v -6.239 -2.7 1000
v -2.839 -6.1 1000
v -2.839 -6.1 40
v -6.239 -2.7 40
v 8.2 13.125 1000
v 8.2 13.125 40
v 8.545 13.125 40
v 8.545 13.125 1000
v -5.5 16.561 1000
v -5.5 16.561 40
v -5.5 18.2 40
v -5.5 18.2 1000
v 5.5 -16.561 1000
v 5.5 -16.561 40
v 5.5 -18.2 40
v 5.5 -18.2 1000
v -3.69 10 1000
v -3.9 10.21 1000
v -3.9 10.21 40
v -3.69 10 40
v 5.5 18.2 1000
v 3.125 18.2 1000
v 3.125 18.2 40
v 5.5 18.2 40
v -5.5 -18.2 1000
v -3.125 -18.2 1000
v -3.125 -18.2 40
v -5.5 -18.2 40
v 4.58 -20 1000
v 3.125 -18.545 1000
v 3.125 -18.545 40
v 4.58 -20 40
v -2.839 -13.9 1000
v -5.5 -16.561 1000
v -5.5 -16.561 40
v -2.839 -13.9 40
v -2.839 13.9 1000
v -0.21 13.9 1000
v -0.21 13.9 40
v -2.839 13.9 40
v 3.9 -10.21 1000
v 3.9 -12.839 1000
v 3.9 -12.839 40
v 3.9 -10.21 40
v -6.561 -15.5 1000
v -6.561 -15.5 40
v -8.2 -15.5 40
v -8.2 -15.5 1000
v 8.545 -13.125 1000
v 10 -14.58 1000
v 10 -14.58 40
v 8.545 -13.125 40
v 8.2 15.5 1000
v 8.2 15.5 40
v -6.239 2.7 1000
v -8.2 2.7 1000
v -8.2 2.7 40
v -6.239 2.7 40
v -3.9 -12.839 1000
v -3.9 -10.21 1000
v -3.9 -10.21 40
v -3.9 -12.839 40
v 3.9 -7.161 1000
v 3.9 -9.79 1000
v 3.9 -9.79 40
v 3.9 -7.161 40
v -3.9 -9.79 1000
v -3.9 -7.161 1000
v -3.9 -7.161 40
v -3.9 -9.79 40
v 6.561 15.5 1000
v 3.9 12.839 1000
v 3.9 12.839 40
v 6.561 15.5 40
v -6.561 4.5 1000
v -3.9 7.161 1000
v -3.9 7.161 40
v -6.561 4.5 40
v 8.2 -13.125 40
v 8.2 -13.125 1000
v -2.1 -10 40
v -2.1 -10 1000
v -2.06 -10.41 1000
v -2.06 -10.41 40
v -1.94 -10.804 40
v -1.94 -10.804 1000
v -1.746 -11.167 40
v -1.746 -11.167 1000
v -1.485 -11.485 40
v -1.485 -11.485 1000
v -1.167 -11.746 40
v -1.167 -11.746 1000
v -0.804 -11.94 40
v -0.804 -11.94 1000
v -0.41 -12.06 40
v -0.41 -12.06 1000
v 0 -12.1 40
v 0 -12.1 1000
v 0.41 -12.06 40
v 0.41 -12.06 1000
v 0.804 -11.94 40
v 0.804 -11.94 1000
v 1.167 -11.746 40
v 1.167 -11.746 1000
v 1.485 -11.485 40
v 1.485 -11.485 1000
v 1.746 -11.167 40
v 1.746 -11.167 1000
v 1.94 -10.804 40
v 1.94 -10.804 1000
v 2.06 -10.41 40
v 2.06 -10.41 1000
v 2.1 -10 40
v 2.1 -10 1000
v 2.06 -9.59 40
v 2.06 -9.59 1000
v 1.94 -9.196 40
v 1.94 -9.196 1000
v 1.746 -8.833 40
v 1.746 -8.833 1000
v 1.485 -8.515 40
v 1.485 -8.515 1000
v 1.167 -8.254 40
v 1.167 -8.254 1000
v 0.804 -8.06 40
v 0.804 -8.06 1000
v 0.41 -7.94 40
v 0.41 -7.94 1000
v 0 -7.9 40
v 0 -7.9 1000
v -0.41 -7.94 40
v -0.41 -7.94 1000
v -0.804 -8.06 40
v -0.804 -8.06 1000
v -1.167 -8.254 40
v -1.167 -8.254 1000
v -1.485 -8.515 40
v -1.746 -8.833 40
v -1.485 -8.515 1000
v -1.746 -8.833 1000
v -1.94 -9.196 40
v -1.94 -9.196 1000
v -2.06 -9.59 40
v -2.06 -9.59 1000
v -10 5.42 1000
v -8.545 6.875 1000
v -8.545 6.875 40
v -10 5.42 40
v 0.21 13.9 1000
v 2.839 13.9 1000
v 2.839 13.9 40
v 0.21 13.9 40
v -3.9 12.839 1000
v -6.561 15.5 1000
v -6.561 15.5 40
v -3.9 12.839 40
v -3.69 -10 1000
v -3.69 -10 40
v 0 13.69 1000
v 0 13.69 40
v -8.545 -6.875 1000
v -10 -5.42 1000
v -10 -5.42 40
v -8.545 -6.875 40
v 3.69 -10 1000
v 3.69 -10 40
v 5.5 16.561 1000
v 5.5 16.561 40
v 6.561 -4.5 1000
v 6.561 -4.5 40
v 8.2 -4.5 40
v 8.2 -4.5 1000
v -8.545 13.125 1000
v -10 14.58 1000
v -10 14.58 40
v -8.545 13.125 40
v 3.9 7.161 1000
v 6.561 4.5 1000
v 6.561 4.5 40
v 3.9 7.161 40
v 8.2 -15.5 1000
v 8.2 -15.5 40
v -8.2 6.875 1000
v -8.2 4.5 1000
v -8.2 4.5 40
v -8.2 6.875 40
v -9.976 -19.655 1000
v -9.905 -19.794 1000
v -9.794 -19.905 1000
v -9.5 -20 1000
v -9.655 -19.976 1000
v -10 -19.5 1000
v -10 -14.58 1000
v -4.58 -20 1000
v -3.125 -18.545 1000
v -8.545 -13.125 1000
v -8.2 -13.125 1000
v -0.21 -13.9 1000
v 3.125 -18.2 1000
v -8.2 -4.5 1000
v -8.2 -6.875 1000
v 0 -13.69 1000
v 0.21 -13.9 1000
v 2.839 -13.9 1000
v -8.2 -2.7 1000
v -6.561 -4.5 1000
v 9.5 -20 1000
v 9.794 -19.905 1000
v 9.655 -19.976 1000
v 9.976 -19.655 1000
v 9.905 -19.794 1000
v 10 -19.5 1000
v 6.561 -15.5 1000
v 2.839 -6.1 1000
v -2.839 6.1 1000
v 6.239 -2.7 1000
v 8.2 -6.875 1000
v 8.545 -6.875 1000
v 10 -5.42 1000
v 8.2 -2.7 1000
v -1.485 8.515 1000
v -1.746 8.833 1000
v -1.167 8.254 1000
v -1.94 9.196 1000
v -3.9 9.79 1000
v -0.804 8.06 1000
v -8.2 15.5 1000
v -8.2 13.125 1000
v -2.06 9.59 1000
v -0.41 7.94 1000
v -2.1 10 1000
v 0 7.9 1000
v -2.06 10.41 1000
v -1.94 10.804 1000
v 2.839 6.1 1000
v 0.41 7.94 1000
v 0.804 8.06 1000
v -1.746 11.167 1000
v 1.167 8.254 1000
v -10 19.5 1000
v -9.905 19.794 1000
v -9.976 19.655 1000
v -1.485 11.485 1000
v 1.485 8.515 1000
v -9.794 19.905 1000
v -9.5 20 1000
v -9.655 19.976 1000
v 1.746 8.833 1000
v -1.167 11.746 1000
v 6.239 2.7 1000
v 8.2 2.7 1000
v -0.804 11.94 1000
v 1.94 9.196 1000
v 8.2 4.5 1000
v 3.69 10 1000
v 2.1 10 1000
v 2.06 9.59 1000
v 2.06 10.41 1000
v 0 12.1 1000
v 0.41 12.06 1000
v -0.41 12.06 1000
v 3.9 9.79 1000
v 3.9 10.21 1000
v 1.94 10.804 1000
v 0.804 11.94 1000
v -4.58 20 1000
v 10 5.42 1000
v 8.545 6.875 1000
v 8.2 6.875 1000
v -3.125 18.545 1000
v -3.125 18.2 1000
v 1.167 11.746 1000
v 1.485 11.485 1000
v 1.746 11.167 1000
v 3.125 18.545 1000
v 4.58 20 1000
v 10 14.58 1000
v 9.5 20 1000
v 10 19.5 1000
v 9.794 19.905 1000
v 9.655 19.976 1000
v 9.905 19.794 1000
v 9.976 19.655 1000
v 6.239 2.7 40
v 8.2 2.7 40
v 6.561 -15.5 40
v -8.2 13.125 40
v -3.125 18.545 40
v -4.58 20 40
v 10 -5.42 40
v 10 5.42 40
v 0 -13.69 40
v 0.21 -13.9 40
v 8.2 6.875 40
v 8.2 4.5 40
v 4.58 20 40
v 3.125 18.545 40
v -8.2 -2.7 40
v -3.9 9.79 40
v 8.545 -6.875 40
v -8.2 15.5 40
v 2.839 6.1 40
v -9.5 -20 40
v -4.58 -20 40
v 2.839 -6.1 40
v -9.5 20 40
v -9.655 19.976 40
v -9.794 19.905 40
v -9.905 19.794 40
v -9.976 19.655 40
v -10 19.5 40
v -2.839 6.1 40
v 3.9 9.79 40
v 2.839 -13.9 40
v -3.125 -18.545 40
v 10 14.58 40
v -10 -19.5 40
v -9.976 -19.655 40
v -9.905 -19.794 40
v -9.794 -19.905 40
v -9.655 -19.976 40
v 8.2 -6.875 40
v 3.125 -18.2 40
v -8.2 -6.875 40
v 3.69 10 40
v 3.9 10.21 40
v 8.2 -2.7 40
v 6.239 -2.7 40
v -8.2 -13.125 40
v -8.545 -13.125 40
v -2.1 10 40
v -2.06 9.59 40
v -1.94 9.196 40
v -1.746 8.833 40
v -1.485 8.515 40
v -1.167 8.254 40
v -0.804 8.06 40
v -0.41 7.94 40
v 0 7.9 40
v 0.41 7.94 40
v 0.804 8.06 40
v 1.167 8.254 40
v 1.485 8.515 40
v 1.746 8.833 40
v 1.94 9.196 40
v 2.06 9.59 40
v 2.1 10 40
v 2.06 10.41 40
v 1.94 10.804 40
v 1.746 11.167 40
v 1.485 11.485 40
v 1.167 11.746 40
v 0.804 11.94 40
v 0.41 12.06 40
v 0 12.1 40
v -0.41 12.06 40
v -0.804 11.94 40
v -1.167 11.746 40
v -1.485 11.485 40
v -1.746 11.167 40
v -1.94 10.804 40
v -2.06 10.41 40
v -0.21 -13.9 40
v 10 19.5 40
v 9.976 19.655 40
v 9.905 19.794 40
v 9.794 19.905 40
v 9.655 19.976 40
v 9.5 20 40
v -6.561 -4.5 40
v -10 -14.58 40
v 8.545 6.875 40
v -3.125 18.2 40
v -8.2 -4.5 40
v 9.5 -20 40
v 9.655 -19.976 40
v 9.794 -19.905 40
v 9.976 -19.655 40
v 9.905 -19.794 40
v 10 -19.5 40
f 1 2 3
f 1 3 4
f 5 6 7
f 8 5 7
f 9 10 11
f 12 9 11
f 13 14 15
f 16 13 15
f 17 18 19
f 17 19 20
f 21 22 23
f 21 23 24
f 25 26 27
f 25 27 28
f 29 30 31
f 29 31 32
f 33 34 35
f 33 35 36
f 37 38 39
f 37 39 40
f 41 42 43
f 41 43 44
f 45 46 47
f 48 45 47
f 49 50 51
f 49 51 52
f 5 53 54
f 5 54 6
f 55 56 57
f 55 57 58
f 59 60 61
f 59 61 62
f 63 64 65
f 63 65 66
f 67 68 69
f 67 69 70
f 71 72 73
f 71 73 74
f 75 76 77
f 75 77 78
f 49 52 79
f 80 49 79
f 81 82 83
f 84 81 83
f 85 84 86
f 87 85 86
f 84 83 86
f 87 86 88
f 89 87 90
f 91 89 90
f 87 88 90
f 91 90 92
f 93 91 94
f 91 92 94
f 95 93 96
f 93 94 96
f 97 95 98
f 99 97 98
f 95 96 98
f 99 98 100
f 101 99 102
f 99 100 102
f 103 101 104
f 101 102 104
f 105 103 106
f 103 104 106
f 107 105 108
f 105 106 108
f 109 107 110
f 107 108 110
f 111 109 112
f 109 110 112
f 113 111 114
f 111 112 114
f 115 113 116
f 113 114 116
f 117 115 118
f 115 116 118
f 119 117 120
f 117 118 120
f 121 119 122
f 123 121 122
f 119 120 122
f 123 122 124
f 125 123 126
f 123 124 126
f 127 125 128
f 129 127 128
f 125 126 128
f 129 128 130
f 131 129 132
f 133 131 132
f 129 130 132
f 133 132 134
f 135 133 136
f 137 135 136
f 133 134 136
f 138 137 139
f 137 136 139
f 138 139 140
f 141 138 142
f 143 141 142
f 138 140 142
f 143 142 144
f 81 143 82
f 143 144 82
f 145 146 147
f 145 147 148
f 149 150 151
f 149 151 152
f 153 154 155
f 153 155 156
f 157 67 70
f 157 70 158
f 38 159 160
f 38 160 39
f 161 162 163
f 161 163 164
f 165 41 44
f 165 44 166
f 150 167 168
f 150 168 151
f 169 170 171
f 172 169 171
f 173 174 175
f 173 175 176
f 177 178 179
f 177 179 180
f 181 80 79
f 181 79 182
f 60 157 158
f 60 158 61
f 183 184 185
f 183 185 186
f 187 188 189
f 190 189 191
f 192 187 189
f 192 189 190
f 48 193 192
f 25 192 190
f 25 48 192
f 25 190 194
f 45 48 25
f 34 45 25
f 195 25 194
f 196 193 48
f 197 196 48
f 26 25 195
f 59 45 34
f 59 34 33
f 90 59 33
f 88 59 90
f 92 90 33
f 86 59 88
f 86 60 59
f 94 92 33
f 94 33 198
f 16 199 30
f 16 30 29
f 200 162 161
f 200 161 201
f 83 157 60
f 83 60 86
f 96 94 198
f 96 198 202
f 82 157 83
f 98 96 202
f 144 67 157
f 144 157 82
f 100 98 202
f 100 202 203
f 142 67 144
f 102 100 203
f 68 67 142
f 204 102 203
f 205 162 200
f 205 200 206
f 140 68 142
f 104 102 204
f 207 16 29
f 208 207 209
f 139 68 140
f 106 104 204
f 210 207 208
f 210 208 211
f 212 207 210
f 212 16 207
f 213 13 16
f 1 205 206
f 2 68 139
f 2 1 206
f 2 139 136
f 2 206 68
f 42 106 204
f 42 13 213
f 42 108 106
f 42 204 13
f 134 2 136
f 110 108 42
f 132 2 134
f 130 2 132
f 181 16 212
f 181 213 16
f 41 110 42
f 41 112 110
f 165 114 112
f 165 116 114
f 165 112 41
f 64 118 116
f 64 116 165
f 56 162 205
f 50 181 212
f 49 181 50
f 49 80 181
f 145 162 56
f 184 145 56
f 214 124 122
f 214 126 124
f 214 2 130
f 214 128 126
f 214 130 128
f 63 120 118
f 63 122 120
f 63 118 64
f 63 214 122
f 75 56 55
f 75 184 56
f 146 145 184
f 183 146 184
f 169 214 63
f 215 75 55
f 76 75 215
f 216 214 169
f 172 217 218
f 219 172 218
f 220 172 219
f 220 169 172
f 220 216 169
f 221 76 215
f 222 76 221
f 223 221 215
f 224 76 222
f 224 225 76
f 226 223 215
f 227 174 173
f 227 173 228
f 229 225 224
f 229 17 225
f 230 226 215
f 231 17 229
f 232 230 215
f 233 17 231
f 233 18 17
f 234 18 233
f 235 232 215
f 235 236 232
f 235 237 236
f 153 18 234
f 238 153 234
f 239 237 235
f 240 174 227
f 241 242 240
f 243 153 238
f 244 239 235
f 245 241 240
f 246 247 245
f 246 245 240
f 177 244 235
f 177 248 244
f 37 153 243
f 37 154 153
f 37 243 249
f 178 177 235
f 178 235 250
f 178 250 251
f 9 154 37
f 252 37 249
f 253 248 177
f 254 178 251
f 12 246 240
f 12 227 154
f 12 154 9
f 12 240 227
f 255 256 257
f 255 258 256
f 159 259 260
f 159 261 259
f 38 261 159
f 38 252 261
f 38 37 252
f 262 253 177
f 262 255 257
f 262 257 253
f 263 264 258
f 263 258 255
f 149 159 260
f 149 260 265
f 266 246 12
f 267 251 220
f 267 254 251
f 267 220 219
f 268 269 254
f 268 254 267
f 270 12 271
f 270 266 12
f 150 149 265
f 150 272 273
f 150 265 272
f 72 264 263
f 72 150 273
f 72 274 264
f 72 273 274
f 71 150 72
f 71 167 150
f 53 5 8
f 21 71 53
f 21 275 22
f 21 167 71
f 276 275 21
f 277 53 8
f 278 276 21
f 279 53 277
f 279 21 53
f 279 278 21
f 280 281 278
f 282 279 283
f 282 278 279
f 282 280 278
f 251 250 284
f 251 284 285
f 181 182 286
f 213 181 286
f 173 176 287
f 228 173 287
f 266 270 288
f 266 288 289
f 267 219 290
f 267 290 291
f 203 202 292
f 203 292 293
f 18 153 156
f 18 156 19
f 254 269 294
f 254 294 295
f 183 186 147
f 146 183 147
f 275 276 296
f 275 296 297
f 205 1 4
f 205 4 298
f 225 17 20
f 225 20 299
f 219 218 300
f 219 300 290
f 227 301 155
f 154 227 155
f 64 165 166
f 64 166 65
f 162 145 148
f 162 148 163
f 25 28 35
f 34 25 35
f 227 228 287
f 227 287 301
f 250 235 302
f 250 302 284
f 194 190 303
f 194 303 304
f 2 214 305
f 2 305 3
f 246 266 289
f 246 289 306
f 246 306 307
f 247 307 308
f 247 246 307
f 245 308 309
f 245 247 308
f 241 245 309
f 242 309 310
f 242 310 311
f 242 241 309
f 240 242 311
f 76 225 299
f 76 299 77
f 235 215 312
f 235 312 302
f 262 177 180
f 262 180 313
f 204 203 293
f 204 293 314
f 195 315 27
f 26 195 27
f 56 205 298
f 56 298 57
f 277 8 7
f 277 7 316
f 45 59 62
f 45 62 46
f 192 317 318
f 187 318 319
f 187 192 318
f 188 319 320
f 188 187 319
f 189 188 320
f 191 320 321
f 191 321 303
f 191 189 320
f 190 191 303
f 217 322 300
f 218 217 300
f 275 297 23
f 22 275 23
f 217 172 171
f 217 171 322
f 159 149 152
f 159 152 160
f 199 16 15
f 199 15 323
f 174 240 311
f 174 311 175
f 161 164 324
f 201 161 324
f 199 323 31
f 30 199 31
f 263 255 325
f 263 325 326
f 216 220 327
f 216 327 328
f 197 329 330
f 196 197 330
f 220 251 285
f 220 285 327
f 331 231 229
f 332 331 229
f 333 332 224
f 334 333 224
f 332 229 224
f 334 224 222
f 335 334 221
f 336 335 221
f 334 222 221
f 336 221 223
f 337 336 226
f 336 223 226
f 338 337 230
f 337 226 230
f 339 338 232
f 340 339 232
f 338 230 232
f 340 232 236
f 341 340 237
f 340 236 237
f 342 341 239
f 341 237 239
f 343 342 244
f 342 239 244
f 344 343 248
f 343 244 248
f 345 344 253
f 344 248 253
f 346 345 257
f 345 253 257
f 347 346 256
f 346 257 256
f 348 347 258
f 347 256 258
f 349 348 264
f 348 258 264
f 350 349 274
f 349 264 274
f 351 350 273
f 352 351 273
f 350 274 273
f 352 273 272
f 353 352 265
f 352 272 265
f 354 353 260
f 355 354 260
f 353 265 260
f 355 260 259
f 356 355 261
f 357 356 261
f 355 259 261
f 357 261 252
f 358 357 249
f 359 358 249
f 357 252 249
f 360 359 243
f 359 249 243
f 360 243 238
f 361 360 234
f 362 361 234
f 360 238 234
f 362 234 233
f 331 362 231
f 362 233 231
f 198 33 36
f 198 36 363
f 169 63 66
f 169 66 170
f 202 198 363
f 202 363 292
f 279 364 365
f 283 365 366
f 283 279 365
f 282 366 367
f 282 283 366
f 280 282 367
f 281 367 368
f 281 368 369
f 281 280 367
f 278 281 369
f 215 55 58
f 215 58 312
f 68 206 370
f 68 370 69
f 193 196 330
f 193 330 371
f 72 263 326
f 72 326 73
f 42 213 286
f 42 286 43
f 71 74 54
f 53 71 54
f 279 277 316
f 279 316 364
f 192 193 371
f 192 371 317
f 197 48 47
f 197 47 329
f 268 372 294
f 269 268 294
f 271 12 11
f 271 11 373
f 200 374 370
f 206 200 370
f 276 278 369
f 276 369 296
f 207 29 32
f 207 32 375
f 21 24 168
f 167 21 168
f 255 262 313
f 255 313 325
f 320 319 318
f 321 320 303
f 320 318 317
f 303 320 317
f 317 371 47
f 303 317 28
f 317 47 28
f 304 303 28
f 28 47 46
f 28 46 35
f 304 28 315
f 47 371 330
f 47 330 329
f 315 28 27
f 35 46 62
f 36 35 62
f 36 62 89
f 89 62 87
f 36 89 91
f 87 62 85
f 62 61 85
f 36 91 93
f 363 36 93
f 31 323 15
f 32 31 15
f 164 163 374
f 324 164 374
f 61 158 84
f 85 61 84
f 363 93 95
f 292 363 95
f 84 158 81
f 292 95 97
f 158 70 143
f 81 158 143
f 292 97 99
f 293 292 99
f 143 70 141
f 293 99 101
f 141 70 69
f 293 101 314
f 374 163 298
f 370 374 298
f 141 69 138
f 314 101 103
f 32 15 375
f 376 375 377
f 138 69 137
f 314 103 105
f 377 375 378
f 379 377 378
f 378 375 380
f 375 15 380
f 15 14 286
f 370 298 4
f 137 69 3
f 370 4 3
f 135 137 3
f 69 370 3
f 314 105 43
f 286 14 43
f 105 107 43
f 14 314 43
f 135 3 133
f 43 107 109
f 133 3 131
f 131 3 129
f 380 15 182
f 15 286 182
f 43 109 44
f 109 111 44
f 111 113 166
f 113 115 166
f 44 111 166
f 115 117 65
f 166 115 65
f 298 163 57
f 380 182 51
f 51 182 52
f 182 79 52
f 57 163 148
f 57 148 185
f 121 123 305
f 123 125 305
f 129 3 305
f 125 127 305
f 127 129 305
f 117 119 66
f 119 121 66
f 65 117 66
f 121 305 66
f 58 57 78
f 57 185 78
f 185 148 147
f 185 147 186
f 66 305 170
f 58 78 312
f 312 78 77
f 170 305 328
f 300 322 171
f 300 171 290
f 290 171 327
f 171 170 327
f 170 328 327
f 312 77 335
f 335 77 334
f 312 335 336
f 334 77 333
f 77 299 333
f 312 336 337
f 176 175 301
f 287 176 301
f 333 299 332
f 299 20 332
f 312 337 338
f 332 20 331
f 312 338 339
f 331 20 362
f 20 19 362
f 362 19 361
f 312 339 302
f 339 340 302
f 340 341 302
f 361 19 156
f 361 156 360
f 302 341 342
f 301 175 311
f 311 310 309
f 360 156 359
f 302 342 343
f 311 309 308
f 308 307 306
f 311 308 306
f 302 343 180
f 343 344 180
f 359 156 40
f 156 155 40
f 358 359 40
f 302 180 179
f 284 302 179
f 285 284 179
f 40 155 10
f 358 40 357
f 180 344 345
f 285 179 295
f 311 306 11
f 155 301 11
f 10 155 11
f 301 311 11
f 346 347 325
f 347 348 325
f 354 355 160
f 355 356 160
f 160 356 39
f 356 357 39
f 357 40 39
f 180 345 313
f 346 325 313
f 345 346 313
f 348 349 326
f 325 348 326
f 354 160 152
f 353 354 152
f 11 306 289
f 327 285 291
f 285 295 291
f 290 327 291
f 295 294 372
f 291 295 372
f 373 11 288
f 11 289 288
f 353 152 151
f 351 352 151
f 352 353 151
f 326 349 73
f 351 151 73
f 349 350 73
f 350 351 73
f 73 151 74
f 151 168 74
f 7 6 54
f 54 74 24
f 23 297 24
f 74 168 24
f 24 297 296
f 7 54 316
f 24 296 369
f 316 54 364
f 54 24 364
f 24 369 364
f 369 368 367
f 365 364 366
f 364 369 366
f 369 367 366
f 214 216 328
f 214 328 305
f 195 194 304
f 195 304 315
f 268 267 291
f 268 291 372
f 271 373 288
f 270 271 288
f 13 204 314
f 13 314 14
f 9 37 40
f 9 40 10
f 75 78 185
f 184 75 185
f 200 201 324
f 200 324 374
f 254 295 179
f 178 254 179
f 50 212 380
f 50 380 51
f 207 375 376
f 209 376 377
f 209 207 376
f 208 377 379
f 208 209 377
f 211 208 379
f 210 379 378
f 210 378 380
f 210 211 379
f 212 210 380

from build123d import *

# Parameters (mm, degrees)
SKETCH1_R           = 2.1
BOSS_EXTRUDE1_DEPTH = 960


with BuildPart() as part:
    # Sketch1 → Boss-Extrude1 (new body)
    with BuildSketch(Plane.XY.offset(1000)):
        with BuildLine():
            Line((6.560660172, 4.5), (3.9, 7.160660172))
            Line((3.9, 7.160660172), (3.9, 9.79))
            Line((3.9, 9.79), (3.69, 10))
            Line((3.69, 10), (3.9, 10.21))
            Line((3.9, 10.21), (3.9, 12.839339828))
            Line((3.9, 12.839339828), (6.560660172, 15.5))
            Line((6.560660172, 15.5), (8.2, 15.5))
            Line((8.2, 15.5), (8.2, 13.125))
            Line((8.2, 13.125), (8.545, 13.125))
            Line((8.545, 13.125), (10, 14.58))
            Line((10, 14.58), (10, 19.5))
            ThreePointArc((10, 19.5), (9.853553391, 19.853553391), (9.5, 20))
            Line((9.5, 20), (4.58, 20))
            Line((4.58, 20), (3.125, 18.545))
            Line((3.125, 18.545), (3.125, 18.2))
            Line((3.125, 18.2), (5.5, 18.2))
            Line((5.5, 18.2), (5.5, 16.560660172))
            Line((5.5, 16.560660172), (2.839339828, 13.9))
            Line((2.839339828, 13.9), (0.21, 13.9))
            Line((0.21, 13.9), (0, 13.69))
            Line((0, 13.69), (-0.21, 13.9))
            Line((-0.21, 13.9), (-2.839339828, 13.9))
            Line((-2.839339828, 13.9), (-5.5, 16.560660172))
            Line((-5.5, 16.560660172), (-5.5, 18.2))
            Line((-5.5, 18.2), (-3.125, 18.2))
            Line((-3.125, 18.2), (-3.125, 18.545))
            Line((-3.125, 18.545), (-4.58, 20))
            Line((-4.58, 20), (-9.5, 20))
            ThreePointArc((-9.5, 20), (-9.853553391, 19.853553391), (-10, 19.5))
            Line((-10, 19.5), (-10, 14.58))
            Line((-10, 14.58), (-8.545, 13.125))
            Line((-8.545, 13.125), (-8.2, 13.125))
            Line((-8.2, 13.125), (-8.2, 15.5))
            Line((-8.2, 15.5), (-6.560660172, 15.5))
            Line((-6.560660172, 15.5), (-3.9, 12.839339828))
            Line((-3.9, 12.839339828), (-3.9, 10.21))
            Line((-3.9, 10.21), (-3.69, 10))
            Line((-3.69, 10), (-3.9, 9.79))
            Line((-3.9, 9.79), (-3.9, 7.160660172))
            Line((-3.9, 7.160660172), (-6.560660172, 4.5))
            Line((-6.560660172, 4.5), (-8.2, 4.5))
            Line((-8.2, 4.5), (-8.2, 6.875))
            Line((-8.2, 6.875), (-8.545, 6.875))
            Line((-8.545, 6.875), (-10, 5.42))
            Line((-10, 5.42), (-10, -5.42))
            Line((-10, -5.42), (-8.545, -6.875))
            Line((-8.545, -6.875), (-8.2, -6.875))
            Line((-8.2, -6.875), (-8.2, -4.5))
            Line((-8.2, -4.5), (-6.560660172, -4.5))
            Line((-6.560660172, -4.5), (-3.9, -7.160660172))
            Line((-3.9, -7.160660172), (-3.9, -9.79))
            Line((-3.9, -9.79), (-3.69, -10))
            Line((-3.69, -10), (-3.9, -10.21))
            Line((-3.9, -10.21), (-3.9, -12.839339828))
            Line((-3.9, -12.839339828), (-6.560660172, -15.5))
            Line((-6.560660172, -15.5), (-8.2, -15.5))
            Line((-8.2, -15.5), (-8.2, -13.125))
            Line((-8.2, -13.125), (-8.545, -13.125))
            Line((-8.545, -13.125), (-10, -14.58))
            Line((-10, -14.58), (-10, -19.5))
            ThreePointArc((-10, -19.5), (-9.853553391, -19.853553391), (-9.5, -20))
            Line((-9.5, -20), (-4.58, -20))
            Line((-4.58, -20), (-3.125, -18.545))
            Line((-3.125, -18.545), (-3.125, -18.2))
            Line((-3.125, -18.2), (-5.5, -18.2))
            Line((-5.5, -18.2), (-5.5, -16.560660172))
            Line((-5.5, -16.560660172), (-2.839339828, -13.9))
            Line((-2.839339828, -13.9), (-0.21, -13.9))
            Line((-0.21, -13.9), (0, -13.69))
            Line((0, -13.69), (0.21, -13.9))
            Line((0.21, -13.9), (2.839339828, -13.9))
            Line((2.839339828, -13.9), (5.5, -16.560660172))
            Line((5.5, -16.560660172), (5.5, -18.2))
            Line((5.5, -18.2), (3.125, -18.2))
            Line((3.125, -18.2), (3.125, -18.545))
            Line((3.125, -18.545), (4.58, -20))
            Line((4.58, -20), (9.5, -20))
            ThreePointArc((9.5, -20), (9.853553391, -19.853553391), (10, -19.5))
            Line((10, -19.5), (10, -14.58))
            Line((10, -14.58), (8.545, -13.125))
            Line((8.545, -13.125), (8.2, -13.125))
            Line((8.2, -13.125), (8.2, -15.5))
            Line((8.2, -15.5), (6.560660172, -15.5))
            Line((6.560660172, -15.5), (3.9, -12.839339828))
            Line((3.9, -12.839339828), (3.9, -10.21))
            Line((3.9, -10.21), (3.69, -10))
            Line((3.69, -10), (3.9, -9.79))
            Line((3.9, -9.79), (3.9, -7.160660172))
            Line((3.9, -7.160660172), (6.560660172, -4.5))
            Line((6.560660172, -4.5), (8.2, -4.5))
            Line((8.2, -4.5), (8.2, -6.875))
            Line((8.2, -6.875), (8.545, -6.875))
            Line((8.545, -6.875), (10, -5.42))
            Line((10, -5.42), (10, 5.42))
            Line((10, 5.42), (8.545, 6.875))
            Line((8.545, 6.875), (8.2, 6.875))
            Line((8.2, 6.875), (8.2, 4.5))
            Line((8.2, 4.5), (6.560660172, 4.5))
        make_face()
        with Locations(Location((0, 10, 0), (0, 0, 180))):
            Circle(SKETCH1_R, mode=Mode.SUBTRACT)
        with Locations(Location((0, -10, 0), (0, 0, 180))):
            Circle(SKETCH1_R, mode=Mode.SUBTRACT)
        Polygon((2.839339828, -6.1), (-2.839339828, -6.1), (-6.239339828, -2.7), (-8.2, -2.7), (-8.2, 2.7), (-6.239339828, 2.7), (-2.839339828, 6.1), (2.839339828, 6.1), (6.239339828, 2.7), (8.2, 2.7), (8.2, -2.7), (6.239339828, -2.7), align=None, mode=Mode.SUBTRACT)
    extrude(amount=-BOSS_EXTRUDE1_DEPTH)


solid = part.part
